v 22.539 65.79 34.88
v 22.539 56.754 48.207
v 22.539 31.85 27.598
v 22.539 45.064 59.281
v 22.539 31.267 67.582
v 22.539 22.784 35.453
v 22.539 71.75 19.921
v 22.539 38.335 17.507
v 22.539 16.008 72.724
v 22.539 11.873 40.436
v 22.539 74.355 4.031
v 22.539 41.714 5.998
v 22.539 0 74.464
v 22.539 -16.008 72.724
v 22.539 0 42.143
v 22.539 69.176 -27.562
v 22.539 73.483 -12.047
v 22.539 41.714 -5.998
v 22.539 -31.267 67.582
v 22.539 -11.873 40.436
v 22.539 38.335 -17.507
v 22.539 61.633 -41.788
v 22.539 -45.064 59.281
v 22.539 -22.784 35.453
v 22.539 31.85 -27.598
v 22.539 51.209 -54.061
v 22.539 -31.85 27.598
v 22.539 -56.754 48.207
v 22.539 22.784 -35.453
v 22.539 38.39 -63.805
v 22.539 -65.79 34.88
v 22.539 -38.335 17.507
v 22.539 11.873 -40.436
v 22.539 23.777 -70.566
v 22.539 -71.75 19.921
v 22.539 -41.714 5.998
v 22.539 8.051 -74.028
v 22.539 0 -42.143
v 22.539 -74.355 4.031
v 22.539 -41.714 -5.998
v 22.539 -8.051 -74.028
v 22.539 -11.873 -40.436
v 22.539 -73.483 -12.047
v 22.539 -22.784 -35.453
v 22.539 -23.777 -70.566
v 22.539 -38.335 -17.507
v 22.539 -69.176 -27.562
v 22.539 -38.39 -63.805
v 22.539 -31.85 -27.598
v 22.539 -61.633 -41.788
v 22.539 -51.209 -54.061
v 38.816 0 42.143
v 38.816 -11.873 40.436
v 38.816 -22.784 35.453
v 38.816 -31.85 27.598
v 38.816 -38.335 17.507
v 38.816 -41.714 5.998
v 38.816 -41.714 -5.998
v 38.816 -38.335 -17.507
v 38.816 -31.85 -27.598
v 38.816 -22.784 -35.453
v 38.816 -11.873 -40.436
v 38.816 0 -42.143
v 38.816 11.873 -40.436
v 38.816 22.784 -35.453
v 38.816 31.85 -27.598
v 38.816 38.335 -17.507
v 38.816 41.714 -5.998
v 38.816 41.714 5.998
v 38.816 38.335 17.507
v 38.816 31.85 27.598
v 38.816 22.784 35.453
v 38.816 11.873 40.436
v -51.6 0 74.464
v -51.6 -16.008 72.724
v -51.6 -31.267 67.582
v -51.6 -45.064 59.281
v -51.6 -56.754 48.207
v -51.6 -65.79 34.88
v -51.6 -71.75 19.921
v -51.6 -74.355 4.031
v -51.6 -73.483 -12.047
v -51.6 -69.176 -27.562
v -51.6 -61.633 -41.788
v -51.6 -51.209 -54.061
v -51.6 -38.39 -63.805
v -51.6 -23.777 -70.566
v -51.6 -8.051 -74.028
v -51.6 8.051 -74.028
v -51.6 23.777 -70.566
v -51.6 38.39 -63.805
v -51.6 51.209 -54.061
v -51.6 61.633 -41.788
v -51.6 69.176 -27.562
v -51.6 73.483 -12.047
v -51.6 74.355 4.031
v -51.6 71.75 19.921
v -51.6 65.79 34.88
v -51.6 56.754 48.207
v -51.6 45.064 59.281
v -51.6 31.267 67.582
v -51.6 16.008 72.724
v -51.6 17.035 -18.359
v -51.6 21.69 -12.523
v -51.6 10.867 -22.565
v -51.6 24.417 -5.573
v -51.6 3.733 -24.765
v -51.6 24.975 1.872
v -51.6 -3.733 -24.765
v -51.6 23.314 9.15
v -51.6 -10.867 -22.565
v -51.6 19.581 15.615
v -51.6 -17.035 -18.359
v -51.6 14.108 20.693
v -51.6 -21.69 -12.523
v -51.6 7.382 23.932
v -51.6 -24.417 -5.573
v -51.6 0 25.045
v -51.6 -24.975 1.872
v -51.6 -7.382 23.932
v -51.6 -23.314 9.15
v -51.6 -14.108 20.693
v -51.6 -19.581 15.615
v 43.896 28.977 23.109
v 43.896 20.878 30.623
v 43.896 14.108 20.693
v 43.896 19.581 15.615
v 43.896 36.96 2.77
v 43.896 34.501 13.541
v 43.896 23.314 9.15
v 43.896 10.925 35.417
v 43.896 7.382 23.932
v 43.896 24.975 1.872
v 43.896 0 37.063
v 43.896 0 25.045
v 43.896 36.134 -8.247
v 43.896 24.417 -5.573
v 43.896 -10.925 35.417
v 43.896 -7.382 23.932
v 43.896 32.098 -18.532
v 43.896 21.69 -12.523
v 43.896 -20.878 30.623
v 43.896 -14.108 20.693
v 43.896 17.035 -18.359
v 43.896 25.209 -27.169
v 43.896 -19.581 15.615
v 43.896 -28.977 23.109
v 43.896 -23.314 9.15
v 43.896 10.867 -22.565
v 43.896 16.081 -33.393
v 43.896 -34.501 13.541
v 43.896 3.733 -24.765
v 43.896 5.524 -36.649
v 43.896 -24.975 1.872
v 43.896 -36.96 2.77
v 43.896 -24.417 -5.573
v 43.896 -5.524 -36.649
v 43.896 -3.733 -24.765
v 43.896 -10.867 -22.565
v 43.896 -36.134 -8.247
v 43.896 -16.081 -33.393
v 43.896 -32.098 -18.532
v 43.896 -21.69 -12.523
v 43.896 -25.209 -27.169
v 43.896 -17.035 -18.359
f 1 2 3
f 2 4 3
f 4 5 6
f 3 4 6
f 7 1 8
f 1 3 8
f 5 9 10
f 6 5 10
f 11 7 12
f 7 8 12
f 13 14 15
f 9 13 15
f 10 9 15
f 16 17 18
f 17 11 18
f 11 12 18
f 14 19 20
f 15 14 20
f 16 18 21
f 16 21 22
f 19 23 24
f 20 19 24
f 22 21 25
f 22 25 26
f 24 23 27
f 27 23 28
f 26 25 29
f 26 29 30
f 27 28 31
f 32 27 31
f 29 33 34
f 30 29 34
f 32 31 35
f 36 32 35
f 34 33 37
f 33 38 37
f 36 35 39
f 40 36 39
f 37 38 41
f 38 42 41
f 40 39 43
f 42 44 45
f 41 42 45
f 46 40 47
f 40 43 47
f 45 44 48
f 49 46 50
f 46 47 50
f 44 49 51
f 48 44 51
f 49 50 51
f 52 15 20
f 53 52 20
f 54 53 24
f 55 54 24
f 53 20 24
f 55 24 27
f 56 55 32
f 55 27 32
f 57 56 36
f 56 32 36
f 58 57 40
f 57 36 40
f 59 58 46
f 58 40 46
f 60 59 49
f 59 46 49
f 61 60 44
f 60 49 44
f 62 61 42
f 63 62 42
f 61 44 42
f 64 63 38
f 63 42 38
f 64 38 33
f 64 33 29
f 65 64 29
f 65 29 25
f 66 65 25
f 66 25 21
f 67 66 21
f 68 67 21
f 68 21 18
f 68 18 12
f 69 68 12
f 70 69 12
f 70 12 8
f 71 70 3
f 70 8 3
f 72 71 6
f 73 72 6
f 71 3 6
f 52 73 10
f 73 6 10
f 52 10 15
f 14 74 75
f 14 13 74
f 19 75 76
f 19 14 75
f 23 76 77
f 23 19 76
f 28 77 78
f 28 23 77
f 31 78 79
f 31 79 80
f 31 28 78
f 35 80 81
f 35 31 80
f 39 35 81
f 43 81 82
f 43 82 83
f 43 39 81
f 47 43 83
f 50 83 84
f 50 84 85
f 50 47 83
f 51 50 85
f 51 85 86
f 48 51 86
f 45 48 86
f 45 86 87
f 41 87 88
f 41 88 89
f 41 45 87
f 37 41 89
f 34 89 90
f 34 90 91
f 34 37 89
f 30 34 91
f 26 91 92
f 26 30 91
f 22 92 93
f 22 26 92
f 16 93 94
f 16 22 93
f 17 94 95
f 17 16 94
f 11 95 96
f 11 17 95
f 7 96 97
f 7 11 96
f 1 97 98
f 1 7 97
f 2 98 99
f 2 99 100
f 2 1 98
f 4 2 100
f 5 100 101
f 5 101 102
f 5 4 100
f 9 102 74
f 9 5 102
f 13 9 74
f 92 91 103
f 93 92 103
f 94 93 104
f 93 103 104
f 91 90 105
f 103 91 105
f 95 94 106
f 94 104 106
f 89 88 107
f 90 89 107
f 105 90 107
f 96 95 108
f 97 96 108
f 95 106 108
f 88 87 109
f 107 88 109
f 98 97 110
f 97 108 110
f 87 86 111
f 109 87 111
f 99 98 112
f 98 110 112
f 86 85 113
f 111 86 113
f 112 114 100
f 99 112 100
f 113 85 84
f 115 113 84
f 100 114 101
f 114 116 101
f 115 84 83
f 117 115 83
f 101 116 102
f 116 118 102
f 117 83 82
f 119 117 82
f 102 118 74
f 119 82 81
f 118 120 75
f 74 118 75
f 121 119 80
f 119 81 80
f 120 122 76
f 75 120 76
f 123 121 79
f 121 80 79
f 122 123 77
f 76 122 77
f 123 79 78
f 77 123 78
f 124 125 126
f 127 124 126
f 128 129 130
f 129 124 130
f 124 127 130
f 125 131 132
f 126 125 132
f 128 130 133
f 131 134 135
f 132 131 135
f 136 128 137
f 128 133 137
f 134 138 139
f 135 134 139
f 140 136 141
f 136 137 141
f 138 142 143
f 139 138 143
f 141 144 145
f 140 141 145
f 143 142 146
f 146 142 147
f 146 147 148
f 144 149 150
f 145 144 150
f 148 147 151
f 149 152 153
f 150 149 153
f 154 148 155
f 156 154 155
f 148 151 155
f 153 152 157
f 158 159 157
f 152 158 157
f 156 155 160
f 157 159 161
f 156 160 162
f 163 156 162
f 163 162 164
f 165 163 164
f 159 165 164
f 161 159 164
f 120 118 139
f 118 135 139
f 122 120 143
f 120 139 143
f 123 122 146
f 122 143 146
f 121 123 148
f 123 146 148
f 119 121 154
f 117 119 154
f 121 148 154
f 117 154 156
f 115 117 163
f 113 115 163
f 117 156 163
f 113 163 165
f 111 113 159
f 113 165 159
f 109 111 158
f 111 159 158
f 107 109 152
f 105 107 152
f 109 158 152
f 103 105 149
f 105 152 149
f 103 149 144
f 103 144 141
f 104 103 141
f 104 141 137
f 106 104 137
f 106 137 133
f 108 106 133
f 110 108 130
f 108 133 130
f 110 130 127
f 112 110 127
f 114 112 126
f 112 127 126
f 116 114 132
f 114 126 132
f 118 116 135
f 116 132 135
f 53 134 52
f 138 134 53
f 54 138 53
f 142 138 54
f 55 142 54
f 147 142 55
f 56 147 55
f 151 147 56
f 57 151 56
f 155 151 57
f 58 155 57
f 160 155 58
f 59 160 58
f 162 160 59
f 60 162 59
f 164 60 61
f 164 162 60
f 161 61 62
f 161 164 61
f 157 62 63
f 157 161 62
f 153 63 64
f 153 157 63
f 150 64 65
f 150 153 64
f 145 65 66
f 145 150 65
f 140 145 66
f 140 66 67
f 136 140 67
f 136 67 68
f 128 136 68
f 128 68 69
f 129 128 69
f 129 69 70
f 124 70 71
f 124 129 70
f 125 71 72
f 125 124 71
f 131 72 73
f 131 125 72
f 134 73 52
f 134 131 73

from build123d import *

# Parameters (mm, degrees)
F0_W     = 22.5392356515
F0_H     = 17.0982331038
F0_W_2   = 21.3571861386
F0_H_2   = 32.321177423
F2_DEPTH = 51.5995789319
F4_SIZE  = 5.08


with BuildPart() as f1:
    # F0 (on Front) → F1 (revolve)
    with BuildSketch(Plane.XZ):
        with Locations((11.2696178257, 33.5941463709)):
            Rectangle(F0_W, F0_H)
        with Locations((33.2178287208, 33.5941463709)):
            Rectangle(F0_W_2, F0_H)
        with Locations((11.2696178257, 58.3038516343)):
            Rectangle(F0_W, F0_H_2)
    revolve(axis=Axis((22.569514811, 0, 0), (1, 0, 0)))

    # F2 (add): a face of the model
    f2_faces = [f1.faces().sort_by_distance(p)[0] for p in [
        (0, 0, -72.3582679167),
    ]]
    extrude(f2_faces, amount=F2_DEPTH)

    # F4
    f4_edges = [f1.edges().sort_by_distance(p)[0] for p in [
        (43.896422, 0, -42.143263),
    ]]
    chamfer(f4_edges, length=F4_SIZE)


solid = f1.part
